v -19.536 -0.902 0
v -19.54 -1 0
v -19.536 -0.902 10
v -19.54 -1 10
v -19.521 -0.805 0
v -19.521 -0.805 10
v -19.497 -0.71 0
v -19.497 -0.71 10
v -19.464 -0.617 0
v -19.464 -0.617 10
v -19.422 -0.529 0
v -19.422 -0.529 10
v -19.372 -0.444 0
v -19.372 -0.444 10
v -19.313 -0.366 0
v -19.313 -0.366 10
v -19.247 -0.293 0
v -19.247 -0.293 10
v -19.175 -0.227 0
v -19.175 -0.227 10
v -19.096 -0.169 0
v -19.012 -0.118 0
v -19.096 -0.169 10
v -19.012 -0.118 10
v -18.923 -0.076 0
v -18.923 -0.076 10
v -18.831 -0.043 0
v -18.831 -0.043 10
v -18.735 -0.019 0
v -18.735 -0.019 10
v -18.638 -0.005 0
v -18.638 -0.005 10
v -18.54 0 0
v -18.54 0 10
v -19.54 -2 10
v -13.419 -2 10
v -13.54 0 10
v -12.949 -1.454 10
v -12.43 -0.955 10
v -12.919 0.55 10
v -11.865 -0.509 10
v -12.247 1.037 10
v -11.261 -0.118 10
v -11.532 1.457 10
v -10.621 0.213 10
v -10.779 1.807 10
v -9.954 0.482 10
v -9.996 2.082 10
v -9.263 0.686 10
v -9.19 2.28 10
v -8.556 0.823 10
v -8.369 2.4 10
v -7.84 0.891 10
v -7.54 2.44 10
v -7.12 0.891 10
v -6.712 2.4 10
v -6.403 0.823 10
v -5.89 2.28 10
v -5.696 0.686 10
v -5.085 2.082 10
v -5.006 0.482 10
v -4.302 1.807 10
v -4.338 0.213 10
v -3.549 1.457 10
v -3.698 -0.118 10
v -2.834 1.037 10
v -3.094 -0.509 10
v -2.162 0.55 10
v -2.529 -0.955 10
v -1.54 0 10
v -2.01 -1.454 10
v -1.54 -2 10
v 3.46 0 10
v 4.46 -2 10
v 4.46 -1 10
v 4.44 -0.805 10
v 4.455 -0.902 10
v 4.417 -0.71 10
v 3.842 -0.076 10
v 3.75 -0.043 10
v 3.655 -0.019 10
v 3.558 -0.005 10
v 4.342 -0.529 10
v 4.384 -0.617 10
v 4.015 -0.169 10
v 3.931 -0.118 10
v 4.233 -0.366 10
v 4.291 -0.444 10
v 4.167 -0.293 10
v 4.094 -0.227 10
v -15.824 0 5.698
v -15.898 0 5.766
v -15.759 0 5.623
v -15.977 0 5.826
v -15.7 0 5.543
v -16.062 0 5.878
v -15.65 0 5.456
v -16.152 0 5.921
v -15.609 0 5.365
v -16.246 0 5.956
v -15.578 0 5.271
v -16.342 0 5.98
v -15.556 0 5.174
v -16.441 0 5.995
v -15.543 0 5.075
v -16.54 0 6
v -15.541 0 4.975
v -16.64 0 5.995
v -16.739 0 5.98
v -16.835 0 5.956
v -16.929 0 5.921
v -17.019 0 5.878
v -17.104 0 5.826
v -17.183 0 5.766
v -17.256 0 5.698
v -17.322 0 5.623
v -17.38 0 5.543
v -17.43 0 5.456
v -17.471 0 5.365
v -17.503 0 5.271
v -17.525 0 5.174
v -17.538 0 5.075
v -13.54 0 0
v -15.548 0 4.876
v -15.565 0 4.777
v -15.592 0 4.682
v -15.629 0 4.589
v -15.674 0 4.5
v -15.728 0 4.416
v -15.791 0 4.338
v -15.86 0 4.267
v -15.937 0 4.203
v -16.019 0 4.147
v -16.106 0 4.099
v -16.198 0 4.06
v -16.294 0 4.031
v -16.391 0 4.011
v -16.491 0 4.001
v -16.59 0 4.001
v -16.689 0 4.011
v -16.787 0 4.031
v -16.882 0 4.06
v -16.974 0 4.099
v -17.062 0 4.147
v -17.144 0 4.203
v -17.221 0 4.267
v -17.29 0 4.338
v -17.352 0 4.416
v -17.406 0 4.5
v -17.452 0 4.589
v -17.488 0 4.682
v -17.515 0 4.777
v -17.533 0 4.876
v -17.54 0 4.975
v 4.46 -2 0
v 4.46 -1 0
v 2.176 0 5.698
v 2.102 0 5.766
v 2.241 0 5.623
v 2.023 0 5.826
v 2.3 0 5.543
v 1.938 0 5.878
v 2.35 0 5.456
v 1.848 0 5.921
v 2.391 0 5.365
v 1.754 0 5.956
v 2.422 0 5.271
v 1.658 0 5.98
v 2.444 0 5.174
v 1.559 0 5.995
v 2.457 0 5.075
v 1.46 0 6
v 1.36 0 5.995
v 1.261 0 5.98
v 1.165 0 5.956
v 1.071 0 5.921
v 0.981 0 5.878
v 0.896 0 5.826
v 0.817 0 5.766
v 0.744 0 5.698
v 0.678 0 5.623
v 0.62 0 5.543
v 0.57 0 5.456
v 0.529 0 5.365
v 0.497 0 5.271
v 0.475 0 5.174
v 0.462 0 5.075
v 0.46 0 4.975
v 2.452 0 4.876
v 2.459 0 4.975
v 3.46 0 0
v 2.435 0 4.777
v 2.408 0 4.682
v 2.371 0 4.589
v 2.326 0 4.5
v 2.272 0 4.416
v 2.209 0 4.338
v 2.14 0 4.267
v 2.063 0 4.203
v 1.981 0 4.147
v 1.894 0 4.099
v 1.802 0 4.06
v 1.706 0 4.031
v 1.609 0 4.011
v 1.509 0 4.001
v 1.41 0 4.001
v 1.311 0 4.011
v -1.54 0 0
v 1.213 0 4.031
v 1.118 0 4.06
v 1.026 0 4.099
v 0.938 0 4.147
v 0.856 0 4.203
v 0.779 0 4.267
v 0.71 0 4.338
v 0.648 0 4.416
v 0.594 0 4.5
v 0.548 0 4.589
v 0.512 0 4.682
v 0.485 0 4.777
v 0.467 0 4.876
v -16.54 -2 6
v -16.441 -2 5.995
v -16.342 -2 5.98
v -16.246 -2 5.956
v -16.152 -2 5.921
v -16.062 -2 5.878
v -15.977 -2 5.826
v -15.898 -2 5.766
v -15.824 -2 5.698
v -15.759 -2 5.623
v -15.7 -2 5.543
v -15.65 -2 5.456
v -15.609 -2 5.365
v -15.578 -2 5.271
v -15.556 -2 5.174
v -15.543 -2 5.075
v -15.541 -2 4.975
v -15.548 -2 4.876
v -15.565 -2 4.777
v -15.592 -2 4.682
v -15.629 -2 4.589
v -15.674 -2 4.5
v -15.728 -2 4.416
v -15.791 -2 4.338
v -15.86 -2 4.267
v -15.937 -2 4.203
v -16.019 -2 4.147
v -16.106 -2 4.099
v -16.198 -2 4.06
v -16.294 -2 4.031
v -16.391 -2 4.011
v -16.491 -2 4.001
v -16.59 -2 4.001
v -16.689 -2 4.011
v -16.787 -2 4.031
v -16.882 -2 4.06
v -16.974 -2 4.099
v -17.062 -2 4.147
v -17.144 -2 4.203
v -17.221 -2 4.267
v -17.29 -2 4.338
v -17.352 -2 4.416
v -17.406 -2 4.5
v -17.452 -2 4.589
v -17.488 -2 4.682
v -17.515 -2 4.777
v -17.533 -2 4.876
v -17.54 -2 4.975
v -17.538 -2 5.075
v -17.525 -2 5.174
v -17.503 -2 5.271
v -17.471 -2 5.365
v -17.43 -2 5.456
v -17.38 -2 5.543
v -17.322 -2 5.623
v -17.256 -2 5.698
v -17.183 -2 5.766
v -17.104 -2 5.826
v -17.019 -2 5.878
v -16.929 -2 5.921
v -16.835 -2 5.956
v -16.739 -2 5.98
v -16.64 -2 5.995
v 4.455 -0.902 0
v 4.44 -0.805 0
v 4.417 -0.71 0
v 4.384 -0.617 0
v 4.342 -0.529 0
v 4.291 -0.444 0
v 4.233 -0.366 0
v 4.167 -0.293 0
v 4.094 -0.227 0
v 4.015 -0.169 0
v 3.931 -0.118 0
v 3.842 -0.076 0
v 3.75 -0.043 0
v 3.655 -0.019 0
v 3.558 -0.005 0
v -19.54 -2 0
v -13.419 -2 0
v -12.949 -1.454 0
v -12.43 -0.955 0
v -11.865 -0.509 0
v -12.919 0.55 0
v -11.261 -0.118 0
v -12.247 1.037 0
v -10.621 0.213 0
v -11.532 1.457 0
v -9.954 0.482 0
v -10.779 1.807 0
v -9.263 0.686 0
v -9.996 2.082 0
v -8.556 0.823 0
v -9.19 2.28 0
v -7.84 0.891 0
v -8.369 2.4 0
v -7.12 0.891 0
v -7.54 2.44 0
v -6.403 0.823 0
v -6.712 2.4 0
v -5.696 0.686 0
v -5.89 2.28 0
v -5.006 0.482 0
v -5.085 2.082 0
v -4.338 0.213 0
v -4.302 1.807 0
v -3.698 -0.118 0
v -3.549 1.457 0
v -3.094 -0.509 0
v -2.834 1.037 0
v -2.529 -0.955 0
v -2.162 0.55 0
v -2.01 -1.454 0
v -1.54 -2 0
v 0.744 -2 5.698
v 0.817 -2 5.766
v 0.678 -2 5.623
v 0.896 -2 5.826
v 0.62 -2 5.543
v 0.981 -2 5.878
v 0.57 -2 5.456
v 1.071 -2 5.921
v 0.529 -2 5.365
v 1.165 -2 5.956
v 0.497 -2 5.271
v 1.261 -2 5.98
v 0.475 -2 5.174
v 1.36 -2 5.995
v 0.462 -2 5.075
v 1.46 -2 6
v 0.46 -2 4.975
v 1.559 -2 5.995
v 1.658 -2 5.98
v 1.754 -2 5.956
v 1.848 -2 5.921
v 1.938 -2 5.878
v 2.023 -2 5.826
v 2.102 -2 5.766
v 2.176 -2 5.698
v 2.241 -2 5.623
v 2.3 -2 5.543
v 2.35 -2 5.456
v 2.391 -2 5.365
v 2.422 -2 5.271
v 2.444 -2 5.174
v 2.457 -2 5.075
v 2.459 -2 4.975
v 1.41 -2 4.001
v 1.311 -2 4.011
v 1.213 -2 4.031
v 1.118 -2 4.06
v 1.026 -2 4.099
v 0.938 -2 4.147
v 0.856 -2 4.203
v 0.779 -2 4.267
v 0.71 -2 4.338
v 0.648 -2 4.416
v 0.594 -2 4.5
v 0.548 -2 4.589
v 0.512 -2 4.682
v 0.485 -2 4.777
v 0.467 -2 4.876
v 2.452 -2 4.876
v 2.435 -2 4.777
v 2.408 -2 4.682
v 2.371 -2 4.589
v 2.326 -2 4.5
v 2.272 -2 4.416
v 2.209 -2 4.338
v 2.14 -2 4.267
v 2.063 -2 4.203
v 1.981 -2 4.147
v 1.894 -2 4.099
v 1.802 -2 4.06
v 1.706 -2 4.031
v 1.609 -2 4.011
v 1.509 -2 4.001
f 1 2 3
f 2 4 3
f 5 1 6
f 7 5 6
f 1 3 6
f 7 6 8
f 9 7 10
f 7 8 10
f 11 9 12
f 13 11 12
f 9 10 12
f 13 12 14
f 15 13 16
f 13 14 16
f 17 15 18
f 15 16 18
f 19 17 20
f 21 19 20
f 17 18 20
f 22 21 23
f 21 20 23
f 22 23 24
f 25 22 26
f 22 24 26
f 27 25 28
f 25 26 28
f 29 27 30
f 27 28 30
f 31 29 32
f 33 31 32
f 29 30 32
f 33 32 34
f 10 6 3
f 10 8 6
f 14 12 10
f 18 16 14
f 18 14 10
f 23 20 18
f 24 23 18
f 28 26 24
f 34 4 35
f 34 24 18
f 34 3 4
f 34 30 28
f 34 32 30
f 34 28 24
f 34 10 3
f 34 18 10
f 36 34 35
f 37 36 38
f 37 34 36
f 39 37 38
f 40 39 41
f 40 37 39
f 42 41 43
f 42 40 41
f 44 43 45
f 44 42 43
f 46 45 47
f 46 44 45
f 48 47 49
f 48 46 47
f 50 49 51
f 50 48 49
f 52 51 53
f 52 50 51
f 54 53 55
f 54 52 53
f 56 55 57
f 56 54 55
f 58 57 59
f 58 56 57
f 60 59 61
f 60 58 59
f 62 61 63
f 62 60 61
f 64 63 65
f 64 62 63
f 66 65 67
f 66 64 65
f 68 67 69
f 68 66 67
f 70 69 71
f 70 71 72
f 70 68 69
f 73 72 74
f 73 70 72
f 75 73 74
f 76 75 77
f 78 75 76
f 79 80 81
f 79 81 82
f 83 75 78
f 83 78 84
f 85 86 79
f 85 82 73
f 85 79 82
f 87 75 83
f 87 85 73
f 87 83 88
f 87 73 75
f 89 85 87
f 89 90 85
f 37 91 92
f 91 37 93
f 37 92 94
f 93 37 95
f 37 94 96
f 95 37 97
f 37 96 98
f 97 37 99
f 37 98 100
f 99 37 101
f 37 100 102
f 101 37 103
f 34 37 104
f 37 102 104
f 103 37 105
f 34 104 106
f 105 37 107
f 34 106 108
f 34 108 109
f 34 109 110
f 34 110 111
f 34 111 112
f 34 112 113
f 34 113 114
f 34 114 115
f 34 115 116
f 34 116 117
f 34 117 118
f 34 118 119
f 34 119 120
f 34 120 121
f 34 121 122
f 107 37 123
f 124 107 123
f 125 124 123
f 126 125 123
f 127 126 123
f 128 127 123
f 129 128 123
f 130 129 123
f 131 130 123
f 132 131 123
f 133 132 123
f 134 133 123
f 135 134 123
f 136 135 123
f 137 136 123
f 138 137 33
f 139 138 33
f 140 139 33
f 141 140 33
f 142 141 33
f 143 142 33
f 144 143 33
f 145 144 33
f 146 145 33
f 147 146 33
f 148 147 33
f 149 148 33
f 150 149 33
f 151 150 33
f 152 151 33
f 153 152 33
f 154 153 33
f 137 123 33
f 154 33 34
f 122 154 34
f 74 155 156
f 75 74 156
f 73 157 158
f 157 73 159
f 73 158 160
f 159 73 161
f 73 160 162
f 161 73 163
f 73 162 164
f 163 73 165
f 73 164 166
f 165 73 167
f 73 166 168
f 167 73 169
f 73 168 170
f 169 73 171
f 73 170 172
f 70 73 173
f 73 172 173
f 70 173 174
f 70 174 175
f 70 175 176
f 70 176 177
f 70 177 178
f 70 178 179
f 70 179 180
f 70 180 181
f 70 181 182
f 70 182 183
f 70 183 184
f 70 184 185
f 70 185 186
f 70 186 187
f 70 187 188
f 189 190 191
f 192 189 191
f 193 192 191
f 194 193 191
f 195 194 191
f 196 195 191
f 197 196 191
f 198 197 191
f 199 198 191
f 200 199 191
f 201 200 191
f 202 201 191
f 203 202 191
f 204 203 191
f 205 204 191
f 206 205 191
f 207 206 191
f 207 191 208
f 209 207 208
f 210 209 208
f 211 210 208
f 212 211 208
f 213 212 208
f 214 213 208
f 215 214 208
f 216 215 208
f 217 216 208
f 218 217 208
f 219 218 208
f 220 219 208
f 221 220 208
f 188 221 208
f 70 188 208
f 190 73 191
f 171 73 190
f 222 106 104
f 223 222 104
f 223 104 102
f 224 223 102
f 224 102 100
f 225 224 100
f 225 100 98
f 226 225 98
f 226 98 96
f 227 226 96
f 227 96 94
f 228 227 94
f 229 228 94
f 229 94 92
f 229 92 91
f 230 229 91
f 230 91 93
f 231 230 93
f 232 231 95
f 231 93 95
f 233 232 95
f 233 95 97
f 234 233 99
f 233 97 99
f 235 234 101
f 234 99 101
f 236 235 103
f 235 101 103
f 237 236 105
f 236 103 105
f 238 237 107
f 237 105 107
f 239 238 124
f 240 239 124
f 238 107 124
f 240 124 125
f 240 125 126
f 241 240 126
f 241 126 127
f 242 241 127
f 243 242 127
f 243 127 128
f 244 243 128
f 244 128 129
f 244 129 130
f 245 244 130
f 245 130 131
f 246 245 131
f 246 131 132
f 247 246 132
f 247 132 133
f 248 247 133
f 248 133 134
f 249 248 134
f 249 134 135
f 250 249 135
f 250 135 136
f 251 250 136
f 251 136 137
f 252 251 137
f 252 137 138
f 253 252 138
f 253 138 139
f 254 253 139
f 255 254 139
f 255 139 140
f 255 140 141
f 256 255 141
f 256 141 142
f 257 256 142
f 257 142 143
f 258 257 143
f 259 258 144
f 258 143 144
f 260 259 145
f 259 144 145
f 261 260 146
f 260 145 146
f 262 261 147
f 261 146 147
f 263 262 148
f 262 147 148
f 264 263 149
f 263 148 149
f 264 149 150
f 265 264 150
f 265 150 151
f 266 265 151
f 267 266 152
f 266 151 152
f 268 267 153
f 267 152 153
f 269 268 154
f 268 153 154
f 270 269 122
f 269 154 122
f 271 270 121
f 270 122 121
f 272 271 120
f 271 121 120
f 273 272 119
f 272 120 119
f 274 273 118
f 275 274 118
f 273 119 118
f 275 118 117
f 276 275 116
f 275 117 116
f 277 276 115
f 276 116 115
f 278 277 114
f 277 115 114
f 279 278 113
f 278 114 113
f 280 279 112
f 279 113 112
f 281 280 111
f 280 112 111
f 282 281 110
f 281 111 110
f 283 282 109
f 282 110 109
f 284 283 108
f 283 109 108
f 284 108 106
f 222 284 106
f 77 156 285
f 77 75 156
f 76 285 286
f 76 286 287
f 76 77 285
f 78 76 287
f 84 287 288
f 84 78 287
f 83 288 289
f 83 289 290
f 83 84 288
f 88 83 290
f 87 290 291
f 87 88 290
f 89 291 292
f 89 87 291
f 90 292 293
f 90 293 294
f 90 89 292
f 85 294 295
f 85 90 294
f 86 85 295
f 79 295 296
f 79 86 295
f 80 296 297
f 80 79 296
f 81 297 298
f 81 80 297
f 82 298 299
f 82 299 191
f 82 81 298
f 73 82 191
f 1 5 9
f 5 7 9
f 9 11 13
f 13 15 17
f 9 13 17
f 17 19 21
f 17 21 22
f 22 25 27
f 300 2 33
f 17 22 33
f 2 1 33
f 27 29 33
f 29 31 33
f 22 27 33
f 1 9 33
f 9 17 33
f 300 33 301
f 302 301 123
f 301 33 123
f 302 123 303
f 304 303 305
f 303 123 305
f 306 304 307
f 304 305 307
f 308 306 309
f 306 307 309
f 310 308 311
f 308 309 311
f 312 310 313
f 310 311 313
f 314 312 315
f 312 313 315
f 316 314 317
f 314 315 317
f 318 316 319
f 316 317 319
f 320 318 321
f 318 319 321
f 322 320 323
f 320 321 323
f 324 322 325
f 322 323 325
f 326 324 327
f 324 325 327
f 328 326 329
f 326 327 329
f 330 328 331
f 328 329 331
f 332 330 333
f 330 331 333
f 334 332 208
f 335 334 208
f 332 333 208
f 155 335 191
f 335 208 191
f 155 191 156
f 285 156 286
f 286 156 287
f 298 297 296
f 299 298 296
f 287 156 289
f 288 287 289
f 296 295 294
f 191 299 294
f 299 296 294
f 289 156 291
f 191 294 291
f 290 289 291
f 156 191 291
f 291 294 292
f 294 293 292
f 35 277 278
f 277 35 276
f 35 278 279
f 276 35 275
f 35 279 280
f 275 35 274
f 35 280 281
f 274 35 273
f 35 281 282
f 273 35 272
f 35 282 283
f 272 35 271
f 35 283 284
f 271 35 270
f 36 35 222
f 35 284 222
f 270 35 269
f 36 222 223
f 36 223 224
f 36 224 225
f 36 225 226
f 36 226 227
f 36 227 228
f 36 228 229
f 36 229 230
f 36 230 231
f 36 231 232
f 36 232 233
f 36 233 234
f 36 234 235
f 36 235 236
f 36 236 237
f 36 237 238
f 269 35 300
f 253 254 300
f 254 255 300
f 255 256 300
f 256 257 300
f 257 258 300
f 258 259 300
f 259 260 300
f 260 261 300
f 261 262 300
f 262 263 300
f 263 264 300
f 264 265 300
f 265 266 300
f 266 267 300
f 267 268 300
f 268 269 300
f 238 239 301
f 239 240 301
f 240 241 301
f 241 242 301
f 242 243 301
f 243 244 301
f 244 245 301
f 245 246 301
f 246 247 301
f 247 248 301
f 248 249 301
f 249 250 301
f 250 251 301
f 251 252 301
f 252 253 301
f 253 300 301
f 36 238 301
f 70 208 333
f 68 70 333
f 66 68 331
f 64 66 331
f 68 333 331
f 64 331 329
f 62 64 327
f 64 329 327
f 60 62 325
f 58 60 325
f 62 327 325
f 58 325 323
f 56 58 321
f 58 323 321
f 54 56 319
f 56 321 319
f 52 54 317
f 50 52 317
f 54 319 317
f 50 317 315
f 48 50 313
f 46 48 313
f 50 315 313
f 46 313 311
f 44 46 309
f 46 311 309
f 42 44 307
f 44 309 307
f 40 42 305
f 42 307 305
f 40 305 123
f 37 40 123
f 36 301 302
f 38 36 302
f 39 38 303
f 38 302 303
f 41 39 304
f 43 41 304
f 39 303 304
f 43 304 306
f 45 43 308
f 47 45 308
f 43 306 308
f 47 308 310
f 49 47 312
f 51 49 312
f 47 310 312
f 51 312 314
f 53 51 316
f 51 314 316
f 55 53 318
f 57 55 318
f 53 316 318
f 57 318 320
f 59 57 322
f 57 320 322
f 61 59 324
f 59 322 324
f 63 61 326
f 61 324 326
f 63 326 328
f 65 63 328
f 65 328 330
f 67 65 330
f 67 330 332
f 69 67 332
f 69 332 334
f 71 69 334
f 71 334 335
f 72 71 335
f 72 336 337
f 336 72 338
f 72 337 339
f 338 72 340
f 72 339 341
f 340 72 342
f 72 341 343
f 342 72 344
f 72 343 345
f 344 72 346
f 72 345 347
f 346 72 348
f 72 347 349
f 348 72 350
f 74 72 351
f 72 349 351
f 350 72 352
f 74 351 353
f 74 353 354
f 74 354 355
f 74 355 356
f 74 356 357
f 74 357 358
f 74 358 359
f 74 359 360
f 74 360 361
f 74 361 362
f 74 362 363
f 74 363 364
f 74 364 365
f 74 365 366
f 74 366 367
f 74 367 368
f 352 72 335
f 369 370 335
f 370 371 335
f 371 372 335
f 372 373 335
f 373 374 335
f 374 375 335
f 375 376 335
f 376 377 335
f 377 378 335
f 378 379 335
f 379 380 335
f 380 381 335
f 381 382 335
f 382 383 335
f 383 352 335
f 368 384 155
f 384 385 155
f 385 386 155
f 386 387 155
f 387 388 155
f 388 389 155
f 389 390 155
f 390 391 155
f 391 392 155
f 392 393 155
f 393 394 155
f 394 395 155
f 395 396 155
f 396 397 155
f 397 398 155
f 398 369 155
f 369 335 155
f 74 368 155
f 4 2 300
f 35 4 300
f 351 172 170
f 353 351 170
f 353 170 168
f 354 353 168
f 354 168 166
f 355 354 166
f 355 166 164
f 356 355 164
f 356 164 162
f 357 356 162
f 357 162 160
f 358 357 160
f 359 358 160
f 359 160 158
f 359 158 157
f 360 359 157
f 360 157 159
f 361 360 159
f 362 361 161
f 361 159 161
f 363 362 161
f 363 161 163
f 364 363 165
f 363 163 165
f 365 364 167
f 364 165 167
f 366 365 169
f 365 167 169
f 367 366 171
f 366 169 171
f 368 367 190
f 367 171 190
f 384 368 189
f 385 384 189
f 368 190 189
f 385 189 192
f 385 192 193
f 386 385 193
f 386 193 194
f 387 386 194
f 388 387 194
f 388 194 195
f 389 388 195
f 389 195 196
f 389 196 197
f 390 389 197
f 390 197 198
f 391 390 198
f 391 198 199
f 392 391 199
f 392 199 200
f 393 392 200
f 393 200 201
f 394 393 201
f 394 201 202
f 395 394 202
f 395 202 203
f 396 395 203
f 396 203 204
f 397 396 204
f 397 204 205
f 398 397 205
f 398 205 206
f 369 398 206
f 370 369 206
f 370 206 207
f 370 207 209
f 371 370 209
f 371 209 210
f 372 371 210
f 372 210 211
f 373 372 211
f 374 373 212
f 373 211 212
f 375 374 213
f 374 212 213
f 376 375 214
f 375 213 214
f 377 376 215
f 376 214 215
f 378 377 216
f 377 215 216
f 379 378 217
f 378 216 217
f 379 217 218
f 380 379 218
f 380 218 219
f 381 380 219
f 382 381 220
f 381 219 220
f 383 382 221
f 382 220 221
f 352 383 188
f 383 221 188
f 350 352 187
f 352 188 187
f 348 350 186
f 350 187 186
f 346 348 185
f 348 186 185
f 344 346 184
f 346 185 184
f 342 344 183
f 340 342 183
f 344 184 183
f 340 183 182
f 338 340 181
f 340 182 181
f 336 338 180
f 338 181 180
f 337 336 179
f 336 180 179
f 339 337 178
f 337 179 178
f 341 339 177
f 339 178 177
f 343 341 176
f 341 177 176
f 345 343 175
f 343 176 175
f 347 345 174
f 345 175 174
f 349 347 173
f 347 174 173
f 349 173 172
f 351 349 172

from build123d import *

# Parameters (mm, degrees)
BOSS_EXTRUDE1_DEPTH = 10
SKETCH3_R           = 1
CUT_EXTRUDE1_DEPTH  = 10
FILLET1_R           = 1


with BuildPart() as part:
    # Sketch2 → Boss-Extrude1 (new body)
    with BuildSketch(Plane.XY):
        with BuildLine():
            Line((-19.540356597, 0), (-19.540356597, -2))
            Line((-19.540356597, -2), (-13.418721915, -2))
            ThreePointArc((-13.418721915, -2), (-7.479539256, 0.9), (-1.540356597, -2))
            Line((-1.540356597, -2), (4.459643403, -2))
            Line((4.459643403, -2), (4.459643403, 0))
            Line((4.459643403, 0), (-1.540356597, 0))
            ThreePointArc((-1.540356597, 0), (-7.540356597, 2.439966221), (-13.540356597, 0))
            Line((-13.540356597, 0), (-19.540356597, 0))
        make_face()
    extrude(amount=BOSS_EXTRUDE1_DEPTH)

    # Sketch3 → Cut-Extrude1 (cut)
    with BuildSketch(Plane(origin=(0, 0, 0), x_dir=(1, 0, 0), z_dir=(0, 1, 0))):
        with Locations(Location((-16.540356597, -5, 0), (0, 0, 270))):
            Circle(SKETCH3_R)
        with Locations(Location((1.459643403, -5, 0), (0, 0, 270))):
            Circle(SKETCH3_R)
    extrude(amount=-CUT_EXTRUDE1_DEPTH, mode=Mode.SUBTRACT)

    # Fillet1
    fillet1_edges = [part.edges().sort_by_distance(p)[0] for p in [
        (4.459643403, 0, 5),
        (-19.540356597, 0, 5),
    ]]
    fillet(fillet1_edges, radius=FILLET1_R)


solid = part.part
